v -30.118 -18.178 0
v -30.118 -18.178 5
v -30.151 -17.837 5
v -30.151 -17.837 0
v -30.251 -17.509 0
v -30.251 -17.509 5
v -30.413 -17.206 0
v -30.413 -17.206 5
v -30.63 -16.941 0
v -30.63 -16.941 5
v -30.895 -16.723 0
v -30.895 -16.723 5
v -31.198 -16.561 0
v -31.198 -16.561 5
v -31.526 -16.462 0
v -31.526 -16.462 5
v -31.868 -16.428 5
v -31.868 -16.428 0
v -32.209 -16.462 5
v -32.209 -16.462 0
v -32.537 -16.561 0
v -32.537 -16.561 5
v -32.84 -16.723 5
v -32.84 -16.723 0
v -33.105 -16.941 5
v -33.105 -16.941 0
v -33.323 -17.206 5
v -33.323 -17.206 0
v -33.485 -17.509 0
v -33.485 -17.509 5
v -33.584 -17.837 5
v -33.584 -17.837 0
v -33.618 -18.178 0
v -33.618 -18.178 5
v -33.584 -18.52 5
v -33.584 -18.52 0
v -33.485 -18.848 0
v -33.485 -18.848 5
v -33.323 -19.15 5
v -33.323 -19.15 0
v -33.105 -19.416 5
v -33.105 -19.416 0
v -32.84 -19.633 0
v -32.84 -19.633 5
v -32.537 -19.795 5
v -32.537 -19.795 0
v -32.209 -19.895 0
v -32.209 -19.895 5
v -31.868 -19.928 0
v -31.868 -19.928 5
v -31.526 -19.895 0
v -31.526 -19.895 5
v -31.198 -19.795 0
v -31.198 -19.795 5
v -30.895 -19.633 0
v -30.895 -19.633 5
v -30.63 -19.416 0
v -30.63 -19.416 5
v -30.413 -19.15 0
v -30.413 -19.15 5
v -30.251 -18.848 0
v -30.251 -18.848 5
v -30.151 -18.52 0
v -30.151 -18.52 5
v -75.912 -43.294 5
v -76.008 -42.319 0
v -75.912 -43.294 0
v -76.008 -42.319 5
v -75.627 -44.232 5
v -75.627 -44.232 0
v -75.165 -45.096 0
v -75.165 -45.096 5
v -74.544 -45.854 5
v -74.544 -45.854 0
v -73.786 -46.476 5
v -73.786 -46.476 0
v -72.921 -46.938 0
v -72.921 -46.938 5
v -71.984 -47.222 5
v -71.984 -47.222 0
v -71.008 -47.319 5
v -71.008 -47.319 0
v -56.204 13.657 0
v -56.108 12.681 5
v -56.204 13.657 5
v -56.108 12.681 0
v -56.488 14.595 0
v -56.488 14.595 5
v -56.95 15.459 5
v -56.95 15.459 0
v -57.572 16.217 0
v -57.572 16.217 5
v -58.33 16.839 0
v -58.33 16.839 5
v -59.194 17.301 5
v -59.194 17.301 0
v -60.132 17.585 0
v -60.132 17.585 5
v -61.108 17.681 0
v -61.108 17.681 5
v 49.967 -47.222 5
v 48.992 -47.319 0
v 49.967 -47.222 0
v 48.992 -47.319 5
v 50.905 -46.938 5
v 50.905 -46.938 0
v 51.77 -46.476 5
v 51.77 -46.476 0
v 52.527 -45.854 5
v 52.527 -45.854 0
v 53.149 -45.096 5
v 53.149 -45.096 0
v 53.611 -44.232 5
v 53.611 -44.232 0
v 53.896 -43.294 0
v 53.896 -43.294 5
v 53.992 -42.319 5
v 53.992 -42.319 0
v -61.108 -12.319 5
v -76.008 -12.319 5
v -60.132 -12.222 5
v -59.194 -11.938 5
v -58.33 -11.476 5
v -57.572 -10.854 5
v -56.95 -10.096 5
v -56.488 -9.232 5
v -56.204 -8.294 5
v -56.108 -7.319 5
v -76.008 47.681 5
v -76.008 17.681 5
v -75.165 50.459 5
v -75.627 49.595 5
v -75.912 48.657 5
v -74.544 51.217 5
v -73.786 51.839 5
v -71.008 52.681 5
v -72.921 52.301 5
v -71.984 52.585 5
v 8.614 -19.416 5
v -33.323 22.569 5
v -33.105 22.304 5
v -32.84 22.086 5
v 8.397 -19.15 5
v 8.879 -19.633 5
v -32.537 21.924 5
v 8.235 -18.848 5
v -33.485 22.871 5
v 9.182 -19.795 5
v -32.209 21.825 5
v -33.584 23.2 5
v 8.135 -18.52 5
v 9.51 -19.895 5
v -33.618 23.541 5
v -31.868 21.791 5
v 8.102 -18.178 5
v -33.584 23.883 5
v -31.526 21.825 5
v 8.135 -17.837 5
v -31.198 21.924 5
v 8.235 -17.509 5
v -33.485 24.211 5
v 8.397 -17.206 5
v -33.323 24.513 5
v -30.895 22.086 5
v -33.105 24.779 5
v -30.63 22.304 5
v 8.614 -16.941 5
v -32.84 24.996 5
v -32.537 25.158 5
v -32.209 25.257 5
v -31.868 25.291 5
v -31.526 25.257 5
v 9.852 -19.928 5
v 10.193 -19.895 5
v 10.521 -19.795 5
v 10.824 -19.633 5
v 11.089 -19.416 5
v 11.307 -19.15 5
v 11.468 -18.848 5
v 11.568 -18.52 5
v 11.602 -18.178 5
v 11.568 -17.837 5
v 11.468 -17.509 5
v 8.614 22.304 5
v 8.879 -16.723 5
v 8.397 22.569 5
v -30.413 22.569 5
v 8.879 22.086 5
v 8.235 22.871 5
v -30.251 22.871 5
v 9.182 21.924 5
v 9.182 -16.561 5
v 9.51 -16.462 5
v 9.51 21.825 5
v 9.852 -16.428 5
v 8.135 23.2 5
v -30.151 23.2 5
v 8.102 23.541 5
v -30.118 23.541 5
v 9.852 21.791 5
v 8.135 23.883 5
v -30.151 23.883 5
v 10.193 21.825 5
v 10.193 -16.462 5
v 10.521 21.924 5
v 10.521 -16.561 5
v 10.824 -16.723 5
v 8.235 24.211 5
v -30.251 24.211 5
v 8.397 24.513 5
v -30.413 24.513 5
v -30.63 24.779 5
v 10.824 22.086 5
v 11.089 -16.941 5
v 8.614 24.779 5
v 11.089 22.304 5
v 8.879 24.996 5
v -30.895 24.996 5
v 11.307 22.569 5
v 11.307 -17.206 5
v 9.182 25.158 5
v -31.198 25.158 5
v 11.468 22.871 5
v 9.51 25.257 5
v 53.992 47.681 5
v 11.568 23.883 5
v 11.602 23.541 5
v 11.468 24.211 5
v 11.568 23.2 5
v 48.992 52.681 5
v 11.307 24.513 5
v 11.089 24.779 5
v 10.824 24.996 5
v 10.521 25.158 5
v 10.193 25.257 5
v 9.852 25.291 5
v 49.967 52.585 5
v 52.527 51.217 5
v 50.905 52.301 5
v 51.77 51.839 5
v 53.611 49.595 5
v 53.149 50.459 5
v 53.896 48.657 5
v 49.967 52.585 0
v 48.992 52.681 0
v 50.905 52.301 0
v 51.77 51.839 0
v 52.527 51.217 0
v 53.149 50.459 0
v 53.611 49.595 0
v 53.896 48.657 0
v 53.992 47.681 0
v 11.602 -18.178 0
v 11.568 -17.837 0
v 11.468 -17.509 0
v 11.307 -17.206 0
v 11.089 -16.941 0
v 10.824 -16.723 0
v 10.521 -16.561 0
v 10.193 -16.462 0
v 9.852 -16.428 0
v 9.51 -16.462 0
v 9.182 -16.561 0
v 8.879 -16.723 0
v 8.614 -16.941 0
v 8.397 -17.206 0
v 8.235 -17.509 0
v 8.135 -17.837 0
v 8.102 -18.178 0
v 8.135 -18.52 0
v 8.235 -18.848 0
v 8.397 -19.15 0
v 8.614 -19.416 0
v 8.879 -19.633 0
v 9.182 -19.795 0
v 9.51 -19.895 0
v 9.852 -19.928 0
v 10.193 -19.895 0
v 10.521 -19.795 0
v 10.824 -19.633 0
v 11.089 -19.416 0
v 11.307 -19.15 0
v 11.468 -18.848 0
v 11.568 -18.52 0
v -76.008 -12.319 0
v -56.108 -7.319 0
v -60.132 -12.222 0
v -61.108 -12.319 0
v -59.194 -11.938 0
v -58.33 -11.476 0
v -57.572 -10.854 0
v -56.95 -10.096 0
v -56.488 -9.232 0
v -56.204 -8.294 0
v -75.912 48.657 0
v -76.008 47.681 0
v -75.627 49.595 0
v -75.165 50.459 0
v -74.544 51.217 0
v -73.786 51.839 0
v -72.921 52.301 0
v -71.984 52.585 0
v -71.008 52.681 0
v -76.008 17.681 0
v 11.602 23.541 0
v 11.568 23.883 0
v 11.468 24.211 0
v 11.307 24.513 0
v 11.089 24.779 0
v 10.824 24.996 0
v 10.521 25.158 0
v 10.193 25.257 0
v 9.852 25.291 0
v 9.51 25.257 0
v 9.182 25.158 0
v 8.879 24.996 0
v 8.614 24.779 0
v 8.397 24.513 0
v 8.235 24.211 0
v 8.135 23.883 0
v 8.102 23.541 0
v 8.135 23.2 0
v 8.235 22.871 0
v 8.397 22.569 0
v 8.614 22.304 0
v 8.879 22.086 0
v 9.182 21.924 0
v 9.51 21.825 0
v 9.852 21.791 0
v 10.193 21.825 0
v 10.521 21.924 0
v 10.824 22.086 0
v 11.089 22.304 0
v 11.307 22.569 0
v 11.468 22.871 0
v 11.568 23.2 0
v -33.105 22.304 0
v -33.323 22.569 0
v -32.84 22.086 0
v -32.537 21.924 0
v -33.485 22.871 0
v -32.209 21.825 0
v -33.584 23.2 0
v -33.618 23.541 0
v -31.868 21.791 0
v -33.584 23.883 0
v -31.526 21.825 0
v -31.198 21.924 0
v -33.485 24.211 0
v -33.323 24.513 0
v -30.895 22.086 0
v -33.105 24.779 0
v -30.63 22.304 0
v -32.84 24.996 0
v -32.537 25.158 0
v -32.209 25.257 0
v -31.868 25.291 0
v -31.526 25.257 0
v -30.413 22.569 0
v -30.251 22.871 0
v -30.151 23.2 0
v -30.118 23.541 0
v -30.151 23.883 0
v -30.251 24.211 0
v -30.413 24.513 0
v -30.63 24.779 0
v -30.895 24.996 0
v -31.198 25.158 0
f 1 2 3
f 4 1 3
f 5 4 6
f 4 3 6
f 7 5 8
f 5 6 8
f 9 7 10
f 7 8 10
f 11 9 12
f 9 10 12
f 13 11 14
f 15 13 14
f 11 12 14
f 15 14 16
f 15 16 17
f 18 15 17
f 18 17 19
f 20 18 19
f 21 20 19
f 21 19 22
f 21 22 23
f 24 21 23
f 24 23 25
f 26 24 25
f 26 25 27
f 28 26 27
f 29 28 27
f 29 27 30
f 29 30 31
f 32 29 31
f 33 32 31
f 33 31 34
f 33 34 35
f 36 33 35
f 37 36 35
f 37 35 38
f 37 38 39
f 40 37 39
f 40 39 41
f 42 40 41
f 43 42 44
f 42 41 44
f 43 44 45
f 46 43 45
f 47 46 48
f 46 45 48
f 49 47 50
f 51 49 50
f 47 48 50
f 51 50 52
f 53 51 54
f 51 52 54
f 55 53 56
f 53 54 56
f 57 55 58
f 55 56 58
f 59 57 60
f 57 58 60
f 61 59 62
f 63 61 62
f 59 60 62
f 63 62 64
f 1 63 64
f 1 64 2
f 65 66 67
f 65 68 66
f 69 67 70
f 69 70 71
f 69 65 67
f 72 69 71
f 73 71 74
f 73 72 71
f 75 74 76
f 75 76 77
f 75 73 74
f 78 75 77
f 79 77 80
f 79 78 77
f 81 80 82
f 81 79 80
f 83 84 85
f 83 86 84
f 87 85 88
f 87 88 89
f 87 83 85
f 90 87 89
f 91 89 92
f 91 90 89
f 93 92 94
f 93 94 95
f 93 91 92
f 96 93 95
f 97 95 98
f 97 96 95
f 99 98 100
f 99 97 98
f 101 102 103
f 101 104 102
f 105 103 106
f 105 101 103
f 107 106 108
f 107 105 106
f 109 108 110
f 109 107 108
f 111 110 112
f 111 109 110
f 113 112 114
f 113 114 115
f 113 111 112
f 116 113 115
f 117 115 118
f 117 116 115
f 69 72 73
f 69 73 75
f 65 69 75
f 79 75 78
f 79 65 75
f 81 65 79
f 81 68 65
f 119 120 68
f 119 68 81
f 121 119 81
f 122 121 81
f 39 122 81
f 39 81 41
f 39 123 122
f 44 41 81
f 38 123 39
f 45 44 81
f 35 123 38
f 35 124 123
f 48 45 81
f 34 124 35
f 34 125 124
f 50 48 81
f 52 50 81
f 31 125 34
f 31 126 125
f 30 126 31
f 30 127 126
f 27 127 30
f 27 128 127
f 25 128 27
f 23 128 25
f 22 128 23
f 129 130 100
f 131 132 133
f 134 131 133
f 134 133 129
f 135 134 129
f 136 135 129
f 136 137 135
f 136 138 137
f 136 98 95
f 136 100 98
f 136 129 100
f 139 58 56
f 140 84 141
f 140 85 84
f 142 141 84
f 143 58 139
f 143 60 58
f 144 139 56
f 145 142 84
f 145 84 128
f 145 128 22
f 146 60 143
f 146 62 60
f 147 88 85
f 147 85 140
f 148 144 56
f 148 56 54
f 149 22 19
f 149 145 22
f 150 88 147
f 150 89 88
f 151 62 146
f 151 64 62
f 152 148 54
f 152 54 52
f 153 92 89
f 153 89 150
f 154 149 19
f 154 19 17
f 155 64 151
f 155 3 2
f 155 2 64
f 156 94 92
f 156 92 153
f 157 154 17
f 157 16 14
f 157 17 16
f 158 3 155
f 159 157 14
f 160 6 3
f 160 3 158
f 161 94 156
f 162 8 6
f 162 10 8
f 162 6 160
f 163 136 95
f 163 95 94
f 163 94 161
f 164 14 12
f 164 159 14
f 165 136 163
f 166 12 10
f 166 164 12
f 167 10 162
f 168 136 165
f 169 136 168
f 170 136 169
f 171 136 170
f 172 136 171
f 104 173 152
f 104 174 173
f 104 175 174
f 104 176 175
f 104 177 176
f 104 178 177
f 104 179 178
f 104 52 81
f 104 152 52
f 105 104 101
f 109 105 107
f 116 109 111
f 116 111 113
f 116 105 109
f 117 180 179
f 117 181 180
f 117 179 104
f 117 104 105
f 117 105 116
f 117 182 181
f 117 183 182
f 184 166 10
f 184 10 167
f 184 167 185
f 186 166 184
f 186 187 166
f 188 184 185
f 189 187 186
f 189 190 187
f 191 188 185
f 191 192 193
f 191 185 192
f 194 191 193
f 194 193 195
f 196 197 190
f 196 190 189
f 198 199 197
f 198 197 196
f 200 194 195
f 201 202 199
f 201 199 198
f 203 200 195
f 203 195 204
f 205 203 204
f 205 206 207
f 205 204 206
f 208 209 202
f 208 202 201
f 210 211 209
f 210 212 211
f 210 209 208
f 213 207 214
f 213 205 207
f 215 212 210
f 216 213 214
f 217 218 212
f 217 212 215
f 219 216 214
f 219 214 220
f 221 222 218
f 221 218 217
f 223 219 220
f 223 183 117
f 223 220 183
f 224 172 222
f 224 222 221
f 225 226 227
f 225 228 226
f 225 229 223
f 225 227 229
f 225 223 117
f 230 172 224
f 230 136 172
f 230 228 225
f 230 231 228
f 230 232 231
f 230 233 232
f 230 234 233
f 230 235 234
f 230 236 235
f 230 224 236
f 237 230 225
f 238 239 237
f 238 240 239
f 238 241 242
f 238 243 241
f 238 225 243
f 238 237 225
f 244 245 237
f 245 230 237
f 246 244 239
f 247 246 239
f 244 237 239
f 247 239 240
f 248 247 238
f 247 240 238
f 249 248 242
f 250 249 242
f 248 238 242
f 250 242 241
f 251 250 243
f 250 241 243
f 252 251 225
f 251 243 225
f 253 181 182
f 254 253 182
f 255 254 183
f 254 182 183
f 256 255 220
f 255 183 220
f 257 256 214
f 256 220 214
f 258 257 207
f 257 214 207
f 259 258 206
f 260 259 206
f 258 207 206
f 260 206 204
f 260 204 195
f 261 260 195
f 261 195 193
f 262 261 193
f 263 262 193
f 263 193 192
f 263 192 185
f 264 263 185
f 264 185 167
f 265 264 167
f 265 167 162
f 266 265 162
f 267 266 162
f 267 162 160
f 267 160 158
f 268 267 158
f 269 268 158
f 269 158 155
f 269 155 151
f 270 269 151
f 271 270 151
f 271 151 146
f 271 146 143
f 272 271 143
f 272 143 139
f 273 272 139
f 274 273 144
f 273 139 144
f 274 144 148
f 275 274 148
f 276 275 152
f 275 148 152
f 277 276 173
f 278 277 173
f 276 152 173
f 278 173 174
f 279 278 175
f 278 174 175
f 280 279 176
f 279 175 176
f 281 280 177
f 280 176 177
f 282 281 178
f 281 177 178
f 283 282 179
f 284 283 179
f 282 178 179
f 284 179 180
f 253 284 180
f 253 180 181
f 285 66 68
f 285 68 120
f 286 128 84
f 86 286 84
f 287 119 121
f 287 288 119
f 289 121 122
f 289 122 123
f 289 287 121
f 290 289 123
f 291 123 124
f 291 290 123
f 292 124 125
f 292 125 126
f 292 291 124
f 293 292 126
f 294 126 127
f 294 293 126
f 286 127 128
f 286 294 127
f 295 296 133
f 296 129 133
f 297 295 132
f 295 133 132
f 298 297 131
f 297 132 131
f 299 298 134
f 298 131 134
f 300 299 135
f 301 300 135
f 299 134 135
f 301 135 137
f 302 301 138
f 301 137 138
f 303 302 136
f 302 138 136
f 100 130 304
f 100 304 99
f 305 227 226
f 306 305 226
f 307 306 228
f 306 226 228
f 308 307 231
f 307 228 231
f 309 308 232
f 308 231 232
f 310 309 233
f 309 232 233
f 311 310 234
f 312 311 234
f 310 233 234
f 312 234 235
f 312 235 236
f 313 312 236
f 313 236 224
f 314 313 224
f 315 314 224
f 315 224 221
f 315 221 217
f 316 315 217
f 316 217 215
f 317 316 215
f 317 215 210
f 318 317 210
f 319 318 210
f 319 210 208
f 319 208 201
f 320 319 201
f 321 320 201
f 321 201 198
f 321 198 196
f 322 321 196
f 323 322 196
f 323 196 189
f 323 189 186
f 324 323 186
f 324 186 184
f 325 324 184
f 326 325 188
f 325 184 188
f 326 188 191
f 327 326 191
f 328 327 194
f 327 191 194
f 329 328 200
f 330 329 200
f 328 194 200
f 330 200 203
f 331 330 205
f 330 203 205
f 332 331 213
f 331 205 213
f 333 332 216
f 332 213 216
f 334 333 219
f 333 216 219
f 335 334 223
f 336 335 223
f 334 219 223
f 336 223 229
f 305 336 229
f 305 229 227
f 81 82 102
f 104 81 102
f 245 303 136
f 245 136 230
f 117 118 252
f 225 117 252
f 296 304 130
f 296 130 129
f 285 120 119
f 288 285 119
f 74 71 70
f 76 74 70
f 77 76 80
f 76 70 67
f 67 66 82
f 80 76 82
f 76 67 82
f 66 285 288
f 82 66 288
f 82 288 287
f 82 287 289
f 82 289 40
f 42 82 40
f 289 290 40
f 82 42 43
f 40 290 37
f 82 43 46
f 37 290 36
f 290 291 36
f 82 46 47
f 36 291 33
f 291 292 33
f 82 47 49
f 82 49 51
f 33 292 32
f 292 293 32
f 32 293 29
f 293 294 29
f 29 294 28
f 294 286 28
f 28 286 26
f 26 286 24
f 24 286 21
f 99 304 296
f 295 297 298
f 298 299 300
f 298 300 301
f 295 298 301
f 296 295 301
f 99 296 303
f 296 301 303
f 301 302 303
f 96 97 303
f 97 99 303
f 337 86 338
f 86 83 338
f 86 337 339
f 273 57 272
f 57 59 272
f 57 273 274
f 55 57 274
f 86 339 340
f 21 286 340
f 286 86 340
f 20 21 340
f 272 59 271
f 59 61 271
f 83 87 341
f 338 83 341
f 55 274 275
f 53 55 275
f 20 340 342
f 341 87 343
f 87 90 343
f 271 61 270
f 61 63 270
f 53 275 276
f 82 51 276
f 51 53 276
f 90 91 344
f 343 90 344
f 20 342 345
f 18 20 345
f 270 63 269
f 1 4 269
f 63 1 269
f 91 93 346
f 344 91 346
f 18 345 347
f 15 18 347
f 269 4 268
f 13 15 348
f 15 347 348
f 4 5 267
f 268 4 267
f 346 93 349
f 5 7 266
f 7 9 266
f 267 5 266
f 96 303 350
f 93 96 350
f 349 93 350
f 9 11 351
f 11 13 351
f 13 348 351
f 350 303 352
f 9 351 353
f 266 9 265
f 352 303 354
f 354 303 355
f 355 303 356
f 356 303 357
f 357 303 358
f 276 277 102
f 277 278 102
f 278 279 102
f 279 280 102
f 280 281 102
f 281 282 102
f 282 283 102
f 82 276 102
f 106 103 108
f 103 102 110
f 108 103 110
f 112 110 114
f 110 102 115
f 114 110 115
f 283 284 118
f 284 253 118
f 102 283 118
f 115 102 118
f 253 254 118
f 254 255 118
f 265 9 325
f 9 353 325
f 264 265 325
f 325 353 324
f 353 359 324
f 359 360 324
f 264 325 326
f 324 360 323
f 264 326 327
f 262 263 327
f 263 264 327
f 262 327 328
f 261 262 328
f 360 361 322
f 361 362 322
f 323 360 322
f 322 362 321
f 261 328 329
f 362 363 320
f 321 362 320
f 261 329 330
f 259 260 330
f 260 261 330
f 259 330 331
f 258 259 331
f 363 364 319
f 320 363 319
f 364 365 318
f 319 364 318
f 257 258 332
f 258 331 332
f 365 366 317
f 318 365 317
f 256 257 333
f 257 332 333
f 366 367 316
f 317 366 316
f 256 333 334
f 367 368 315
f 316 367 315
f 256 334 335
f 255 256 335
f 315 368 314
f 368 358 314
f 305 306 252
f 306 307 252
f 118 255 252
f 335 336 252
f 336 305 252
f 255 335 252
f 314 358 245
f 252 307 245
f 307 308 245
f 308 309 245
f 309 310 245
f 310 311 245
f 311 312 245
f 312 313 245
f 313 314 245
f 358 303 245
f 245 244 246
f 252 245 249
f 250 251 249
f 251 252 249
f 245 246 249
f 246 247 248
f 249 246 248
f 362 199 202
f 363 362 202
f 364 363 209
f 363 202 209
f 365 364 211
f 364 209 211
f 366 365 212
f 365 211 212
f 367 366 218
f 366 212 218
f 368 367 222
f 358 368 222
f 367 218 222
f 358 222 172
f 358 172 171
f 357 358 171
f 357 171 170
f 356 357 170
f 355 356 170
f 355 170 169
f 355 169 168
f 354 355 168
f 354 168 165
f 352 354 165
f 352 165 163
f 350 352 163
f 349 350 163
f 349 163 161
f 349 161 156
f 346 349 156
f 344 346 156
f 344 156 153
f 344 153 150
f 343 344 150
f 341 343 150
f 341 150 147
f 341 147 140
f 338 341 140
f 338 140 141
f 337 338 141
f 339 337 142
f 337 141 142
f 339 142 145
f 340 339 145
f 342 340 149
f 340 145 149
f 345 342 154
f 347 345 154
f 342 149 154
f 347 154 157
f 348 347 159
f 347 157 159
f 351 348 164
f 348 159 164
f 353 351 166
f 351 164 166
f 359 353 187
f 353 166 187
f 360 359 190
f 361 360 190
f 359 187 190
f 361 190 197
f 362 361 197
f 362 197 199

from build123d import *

# Parameters (mm, degrees)
ESQUISSE1_W             = 130
ESQUISSE1_H             = 100
BOSS_EXTRU_1_DEPTH      = 5
ESQUISSE2_R             = 1.75
ENL_V_MAT_EXTRU_1_DEPTH = 10
ESQUISSE4_W             = 19.900527691
ESQUISSE4_H             = 30
ENL_V_MAT_EXTRU_2_DEPTH = 10
CONG_1_R                = 5


with BuildPart() as part:
    # Esquisse1 → Boss.-Extru.1 (new body)
    with BuildSketch(Plane.XY):
        with Locations((-11.008064516, 2.681451613)):
            Rectangle(ESQUISSE1_W, ESQUISSE1_H)
    extrude(amount=BOSS_EXTRU_1_DEPTH)

    # Esquisse2 → Enlèv. mat.-Extru.1 (cut)
    with BuildSketch(Plane.XY.offset(5)):
        with Locations((9.851585529, -18.178198432)):
            Circle(ESQUISSE2_R)
        with Locations((-31.867714561, -18.178198432)):
            Circle(ESQUISSE2_R)
        with Locations((-31.867714561, 23.541101658)):
            Circle(ESQUISSE2_R)
        with Locations((9.851585529, 23.541101658)):
            Circle(ESQUISSE2_R)
    extrude(amount=-ENL_V_MAT_EXTRU_1_DEPTH, mode=Mode.SUBTRACT)

    # Esquisse4 → Enlèv. mat.-Extru.2 (cut)
    with BuildSketch(Plane.XY.offset(5)):
        with Locations((-66.057800671, 2.681451613)):
            Rectangle(ESQUISSE4_W, ESQUISSE4_H)
    extrude(amount=-ENL_V_MAT_EXTRU_2_DEPTH, mode=Mode.SUBTRACT)

    # Congé1
    cong_1_edges = [part.edges().sort_by_distance(p)[0] for p in [
        (-56.107536825, 17.681451613, 2.5),
        (-56.107536825, -12.318548387, 2.5),
        (-76.008064516, 52.681451613, 2.5),
        (53.991935484, 52.681451613, 2.5),
        (53.991935484, -47.318548387, 2.5),
        (-76.008064516, -47.318548387, 2.5),
    ]]
    fillet(cong_1_edges, radius=CONG_1_R)


solid = part.part
